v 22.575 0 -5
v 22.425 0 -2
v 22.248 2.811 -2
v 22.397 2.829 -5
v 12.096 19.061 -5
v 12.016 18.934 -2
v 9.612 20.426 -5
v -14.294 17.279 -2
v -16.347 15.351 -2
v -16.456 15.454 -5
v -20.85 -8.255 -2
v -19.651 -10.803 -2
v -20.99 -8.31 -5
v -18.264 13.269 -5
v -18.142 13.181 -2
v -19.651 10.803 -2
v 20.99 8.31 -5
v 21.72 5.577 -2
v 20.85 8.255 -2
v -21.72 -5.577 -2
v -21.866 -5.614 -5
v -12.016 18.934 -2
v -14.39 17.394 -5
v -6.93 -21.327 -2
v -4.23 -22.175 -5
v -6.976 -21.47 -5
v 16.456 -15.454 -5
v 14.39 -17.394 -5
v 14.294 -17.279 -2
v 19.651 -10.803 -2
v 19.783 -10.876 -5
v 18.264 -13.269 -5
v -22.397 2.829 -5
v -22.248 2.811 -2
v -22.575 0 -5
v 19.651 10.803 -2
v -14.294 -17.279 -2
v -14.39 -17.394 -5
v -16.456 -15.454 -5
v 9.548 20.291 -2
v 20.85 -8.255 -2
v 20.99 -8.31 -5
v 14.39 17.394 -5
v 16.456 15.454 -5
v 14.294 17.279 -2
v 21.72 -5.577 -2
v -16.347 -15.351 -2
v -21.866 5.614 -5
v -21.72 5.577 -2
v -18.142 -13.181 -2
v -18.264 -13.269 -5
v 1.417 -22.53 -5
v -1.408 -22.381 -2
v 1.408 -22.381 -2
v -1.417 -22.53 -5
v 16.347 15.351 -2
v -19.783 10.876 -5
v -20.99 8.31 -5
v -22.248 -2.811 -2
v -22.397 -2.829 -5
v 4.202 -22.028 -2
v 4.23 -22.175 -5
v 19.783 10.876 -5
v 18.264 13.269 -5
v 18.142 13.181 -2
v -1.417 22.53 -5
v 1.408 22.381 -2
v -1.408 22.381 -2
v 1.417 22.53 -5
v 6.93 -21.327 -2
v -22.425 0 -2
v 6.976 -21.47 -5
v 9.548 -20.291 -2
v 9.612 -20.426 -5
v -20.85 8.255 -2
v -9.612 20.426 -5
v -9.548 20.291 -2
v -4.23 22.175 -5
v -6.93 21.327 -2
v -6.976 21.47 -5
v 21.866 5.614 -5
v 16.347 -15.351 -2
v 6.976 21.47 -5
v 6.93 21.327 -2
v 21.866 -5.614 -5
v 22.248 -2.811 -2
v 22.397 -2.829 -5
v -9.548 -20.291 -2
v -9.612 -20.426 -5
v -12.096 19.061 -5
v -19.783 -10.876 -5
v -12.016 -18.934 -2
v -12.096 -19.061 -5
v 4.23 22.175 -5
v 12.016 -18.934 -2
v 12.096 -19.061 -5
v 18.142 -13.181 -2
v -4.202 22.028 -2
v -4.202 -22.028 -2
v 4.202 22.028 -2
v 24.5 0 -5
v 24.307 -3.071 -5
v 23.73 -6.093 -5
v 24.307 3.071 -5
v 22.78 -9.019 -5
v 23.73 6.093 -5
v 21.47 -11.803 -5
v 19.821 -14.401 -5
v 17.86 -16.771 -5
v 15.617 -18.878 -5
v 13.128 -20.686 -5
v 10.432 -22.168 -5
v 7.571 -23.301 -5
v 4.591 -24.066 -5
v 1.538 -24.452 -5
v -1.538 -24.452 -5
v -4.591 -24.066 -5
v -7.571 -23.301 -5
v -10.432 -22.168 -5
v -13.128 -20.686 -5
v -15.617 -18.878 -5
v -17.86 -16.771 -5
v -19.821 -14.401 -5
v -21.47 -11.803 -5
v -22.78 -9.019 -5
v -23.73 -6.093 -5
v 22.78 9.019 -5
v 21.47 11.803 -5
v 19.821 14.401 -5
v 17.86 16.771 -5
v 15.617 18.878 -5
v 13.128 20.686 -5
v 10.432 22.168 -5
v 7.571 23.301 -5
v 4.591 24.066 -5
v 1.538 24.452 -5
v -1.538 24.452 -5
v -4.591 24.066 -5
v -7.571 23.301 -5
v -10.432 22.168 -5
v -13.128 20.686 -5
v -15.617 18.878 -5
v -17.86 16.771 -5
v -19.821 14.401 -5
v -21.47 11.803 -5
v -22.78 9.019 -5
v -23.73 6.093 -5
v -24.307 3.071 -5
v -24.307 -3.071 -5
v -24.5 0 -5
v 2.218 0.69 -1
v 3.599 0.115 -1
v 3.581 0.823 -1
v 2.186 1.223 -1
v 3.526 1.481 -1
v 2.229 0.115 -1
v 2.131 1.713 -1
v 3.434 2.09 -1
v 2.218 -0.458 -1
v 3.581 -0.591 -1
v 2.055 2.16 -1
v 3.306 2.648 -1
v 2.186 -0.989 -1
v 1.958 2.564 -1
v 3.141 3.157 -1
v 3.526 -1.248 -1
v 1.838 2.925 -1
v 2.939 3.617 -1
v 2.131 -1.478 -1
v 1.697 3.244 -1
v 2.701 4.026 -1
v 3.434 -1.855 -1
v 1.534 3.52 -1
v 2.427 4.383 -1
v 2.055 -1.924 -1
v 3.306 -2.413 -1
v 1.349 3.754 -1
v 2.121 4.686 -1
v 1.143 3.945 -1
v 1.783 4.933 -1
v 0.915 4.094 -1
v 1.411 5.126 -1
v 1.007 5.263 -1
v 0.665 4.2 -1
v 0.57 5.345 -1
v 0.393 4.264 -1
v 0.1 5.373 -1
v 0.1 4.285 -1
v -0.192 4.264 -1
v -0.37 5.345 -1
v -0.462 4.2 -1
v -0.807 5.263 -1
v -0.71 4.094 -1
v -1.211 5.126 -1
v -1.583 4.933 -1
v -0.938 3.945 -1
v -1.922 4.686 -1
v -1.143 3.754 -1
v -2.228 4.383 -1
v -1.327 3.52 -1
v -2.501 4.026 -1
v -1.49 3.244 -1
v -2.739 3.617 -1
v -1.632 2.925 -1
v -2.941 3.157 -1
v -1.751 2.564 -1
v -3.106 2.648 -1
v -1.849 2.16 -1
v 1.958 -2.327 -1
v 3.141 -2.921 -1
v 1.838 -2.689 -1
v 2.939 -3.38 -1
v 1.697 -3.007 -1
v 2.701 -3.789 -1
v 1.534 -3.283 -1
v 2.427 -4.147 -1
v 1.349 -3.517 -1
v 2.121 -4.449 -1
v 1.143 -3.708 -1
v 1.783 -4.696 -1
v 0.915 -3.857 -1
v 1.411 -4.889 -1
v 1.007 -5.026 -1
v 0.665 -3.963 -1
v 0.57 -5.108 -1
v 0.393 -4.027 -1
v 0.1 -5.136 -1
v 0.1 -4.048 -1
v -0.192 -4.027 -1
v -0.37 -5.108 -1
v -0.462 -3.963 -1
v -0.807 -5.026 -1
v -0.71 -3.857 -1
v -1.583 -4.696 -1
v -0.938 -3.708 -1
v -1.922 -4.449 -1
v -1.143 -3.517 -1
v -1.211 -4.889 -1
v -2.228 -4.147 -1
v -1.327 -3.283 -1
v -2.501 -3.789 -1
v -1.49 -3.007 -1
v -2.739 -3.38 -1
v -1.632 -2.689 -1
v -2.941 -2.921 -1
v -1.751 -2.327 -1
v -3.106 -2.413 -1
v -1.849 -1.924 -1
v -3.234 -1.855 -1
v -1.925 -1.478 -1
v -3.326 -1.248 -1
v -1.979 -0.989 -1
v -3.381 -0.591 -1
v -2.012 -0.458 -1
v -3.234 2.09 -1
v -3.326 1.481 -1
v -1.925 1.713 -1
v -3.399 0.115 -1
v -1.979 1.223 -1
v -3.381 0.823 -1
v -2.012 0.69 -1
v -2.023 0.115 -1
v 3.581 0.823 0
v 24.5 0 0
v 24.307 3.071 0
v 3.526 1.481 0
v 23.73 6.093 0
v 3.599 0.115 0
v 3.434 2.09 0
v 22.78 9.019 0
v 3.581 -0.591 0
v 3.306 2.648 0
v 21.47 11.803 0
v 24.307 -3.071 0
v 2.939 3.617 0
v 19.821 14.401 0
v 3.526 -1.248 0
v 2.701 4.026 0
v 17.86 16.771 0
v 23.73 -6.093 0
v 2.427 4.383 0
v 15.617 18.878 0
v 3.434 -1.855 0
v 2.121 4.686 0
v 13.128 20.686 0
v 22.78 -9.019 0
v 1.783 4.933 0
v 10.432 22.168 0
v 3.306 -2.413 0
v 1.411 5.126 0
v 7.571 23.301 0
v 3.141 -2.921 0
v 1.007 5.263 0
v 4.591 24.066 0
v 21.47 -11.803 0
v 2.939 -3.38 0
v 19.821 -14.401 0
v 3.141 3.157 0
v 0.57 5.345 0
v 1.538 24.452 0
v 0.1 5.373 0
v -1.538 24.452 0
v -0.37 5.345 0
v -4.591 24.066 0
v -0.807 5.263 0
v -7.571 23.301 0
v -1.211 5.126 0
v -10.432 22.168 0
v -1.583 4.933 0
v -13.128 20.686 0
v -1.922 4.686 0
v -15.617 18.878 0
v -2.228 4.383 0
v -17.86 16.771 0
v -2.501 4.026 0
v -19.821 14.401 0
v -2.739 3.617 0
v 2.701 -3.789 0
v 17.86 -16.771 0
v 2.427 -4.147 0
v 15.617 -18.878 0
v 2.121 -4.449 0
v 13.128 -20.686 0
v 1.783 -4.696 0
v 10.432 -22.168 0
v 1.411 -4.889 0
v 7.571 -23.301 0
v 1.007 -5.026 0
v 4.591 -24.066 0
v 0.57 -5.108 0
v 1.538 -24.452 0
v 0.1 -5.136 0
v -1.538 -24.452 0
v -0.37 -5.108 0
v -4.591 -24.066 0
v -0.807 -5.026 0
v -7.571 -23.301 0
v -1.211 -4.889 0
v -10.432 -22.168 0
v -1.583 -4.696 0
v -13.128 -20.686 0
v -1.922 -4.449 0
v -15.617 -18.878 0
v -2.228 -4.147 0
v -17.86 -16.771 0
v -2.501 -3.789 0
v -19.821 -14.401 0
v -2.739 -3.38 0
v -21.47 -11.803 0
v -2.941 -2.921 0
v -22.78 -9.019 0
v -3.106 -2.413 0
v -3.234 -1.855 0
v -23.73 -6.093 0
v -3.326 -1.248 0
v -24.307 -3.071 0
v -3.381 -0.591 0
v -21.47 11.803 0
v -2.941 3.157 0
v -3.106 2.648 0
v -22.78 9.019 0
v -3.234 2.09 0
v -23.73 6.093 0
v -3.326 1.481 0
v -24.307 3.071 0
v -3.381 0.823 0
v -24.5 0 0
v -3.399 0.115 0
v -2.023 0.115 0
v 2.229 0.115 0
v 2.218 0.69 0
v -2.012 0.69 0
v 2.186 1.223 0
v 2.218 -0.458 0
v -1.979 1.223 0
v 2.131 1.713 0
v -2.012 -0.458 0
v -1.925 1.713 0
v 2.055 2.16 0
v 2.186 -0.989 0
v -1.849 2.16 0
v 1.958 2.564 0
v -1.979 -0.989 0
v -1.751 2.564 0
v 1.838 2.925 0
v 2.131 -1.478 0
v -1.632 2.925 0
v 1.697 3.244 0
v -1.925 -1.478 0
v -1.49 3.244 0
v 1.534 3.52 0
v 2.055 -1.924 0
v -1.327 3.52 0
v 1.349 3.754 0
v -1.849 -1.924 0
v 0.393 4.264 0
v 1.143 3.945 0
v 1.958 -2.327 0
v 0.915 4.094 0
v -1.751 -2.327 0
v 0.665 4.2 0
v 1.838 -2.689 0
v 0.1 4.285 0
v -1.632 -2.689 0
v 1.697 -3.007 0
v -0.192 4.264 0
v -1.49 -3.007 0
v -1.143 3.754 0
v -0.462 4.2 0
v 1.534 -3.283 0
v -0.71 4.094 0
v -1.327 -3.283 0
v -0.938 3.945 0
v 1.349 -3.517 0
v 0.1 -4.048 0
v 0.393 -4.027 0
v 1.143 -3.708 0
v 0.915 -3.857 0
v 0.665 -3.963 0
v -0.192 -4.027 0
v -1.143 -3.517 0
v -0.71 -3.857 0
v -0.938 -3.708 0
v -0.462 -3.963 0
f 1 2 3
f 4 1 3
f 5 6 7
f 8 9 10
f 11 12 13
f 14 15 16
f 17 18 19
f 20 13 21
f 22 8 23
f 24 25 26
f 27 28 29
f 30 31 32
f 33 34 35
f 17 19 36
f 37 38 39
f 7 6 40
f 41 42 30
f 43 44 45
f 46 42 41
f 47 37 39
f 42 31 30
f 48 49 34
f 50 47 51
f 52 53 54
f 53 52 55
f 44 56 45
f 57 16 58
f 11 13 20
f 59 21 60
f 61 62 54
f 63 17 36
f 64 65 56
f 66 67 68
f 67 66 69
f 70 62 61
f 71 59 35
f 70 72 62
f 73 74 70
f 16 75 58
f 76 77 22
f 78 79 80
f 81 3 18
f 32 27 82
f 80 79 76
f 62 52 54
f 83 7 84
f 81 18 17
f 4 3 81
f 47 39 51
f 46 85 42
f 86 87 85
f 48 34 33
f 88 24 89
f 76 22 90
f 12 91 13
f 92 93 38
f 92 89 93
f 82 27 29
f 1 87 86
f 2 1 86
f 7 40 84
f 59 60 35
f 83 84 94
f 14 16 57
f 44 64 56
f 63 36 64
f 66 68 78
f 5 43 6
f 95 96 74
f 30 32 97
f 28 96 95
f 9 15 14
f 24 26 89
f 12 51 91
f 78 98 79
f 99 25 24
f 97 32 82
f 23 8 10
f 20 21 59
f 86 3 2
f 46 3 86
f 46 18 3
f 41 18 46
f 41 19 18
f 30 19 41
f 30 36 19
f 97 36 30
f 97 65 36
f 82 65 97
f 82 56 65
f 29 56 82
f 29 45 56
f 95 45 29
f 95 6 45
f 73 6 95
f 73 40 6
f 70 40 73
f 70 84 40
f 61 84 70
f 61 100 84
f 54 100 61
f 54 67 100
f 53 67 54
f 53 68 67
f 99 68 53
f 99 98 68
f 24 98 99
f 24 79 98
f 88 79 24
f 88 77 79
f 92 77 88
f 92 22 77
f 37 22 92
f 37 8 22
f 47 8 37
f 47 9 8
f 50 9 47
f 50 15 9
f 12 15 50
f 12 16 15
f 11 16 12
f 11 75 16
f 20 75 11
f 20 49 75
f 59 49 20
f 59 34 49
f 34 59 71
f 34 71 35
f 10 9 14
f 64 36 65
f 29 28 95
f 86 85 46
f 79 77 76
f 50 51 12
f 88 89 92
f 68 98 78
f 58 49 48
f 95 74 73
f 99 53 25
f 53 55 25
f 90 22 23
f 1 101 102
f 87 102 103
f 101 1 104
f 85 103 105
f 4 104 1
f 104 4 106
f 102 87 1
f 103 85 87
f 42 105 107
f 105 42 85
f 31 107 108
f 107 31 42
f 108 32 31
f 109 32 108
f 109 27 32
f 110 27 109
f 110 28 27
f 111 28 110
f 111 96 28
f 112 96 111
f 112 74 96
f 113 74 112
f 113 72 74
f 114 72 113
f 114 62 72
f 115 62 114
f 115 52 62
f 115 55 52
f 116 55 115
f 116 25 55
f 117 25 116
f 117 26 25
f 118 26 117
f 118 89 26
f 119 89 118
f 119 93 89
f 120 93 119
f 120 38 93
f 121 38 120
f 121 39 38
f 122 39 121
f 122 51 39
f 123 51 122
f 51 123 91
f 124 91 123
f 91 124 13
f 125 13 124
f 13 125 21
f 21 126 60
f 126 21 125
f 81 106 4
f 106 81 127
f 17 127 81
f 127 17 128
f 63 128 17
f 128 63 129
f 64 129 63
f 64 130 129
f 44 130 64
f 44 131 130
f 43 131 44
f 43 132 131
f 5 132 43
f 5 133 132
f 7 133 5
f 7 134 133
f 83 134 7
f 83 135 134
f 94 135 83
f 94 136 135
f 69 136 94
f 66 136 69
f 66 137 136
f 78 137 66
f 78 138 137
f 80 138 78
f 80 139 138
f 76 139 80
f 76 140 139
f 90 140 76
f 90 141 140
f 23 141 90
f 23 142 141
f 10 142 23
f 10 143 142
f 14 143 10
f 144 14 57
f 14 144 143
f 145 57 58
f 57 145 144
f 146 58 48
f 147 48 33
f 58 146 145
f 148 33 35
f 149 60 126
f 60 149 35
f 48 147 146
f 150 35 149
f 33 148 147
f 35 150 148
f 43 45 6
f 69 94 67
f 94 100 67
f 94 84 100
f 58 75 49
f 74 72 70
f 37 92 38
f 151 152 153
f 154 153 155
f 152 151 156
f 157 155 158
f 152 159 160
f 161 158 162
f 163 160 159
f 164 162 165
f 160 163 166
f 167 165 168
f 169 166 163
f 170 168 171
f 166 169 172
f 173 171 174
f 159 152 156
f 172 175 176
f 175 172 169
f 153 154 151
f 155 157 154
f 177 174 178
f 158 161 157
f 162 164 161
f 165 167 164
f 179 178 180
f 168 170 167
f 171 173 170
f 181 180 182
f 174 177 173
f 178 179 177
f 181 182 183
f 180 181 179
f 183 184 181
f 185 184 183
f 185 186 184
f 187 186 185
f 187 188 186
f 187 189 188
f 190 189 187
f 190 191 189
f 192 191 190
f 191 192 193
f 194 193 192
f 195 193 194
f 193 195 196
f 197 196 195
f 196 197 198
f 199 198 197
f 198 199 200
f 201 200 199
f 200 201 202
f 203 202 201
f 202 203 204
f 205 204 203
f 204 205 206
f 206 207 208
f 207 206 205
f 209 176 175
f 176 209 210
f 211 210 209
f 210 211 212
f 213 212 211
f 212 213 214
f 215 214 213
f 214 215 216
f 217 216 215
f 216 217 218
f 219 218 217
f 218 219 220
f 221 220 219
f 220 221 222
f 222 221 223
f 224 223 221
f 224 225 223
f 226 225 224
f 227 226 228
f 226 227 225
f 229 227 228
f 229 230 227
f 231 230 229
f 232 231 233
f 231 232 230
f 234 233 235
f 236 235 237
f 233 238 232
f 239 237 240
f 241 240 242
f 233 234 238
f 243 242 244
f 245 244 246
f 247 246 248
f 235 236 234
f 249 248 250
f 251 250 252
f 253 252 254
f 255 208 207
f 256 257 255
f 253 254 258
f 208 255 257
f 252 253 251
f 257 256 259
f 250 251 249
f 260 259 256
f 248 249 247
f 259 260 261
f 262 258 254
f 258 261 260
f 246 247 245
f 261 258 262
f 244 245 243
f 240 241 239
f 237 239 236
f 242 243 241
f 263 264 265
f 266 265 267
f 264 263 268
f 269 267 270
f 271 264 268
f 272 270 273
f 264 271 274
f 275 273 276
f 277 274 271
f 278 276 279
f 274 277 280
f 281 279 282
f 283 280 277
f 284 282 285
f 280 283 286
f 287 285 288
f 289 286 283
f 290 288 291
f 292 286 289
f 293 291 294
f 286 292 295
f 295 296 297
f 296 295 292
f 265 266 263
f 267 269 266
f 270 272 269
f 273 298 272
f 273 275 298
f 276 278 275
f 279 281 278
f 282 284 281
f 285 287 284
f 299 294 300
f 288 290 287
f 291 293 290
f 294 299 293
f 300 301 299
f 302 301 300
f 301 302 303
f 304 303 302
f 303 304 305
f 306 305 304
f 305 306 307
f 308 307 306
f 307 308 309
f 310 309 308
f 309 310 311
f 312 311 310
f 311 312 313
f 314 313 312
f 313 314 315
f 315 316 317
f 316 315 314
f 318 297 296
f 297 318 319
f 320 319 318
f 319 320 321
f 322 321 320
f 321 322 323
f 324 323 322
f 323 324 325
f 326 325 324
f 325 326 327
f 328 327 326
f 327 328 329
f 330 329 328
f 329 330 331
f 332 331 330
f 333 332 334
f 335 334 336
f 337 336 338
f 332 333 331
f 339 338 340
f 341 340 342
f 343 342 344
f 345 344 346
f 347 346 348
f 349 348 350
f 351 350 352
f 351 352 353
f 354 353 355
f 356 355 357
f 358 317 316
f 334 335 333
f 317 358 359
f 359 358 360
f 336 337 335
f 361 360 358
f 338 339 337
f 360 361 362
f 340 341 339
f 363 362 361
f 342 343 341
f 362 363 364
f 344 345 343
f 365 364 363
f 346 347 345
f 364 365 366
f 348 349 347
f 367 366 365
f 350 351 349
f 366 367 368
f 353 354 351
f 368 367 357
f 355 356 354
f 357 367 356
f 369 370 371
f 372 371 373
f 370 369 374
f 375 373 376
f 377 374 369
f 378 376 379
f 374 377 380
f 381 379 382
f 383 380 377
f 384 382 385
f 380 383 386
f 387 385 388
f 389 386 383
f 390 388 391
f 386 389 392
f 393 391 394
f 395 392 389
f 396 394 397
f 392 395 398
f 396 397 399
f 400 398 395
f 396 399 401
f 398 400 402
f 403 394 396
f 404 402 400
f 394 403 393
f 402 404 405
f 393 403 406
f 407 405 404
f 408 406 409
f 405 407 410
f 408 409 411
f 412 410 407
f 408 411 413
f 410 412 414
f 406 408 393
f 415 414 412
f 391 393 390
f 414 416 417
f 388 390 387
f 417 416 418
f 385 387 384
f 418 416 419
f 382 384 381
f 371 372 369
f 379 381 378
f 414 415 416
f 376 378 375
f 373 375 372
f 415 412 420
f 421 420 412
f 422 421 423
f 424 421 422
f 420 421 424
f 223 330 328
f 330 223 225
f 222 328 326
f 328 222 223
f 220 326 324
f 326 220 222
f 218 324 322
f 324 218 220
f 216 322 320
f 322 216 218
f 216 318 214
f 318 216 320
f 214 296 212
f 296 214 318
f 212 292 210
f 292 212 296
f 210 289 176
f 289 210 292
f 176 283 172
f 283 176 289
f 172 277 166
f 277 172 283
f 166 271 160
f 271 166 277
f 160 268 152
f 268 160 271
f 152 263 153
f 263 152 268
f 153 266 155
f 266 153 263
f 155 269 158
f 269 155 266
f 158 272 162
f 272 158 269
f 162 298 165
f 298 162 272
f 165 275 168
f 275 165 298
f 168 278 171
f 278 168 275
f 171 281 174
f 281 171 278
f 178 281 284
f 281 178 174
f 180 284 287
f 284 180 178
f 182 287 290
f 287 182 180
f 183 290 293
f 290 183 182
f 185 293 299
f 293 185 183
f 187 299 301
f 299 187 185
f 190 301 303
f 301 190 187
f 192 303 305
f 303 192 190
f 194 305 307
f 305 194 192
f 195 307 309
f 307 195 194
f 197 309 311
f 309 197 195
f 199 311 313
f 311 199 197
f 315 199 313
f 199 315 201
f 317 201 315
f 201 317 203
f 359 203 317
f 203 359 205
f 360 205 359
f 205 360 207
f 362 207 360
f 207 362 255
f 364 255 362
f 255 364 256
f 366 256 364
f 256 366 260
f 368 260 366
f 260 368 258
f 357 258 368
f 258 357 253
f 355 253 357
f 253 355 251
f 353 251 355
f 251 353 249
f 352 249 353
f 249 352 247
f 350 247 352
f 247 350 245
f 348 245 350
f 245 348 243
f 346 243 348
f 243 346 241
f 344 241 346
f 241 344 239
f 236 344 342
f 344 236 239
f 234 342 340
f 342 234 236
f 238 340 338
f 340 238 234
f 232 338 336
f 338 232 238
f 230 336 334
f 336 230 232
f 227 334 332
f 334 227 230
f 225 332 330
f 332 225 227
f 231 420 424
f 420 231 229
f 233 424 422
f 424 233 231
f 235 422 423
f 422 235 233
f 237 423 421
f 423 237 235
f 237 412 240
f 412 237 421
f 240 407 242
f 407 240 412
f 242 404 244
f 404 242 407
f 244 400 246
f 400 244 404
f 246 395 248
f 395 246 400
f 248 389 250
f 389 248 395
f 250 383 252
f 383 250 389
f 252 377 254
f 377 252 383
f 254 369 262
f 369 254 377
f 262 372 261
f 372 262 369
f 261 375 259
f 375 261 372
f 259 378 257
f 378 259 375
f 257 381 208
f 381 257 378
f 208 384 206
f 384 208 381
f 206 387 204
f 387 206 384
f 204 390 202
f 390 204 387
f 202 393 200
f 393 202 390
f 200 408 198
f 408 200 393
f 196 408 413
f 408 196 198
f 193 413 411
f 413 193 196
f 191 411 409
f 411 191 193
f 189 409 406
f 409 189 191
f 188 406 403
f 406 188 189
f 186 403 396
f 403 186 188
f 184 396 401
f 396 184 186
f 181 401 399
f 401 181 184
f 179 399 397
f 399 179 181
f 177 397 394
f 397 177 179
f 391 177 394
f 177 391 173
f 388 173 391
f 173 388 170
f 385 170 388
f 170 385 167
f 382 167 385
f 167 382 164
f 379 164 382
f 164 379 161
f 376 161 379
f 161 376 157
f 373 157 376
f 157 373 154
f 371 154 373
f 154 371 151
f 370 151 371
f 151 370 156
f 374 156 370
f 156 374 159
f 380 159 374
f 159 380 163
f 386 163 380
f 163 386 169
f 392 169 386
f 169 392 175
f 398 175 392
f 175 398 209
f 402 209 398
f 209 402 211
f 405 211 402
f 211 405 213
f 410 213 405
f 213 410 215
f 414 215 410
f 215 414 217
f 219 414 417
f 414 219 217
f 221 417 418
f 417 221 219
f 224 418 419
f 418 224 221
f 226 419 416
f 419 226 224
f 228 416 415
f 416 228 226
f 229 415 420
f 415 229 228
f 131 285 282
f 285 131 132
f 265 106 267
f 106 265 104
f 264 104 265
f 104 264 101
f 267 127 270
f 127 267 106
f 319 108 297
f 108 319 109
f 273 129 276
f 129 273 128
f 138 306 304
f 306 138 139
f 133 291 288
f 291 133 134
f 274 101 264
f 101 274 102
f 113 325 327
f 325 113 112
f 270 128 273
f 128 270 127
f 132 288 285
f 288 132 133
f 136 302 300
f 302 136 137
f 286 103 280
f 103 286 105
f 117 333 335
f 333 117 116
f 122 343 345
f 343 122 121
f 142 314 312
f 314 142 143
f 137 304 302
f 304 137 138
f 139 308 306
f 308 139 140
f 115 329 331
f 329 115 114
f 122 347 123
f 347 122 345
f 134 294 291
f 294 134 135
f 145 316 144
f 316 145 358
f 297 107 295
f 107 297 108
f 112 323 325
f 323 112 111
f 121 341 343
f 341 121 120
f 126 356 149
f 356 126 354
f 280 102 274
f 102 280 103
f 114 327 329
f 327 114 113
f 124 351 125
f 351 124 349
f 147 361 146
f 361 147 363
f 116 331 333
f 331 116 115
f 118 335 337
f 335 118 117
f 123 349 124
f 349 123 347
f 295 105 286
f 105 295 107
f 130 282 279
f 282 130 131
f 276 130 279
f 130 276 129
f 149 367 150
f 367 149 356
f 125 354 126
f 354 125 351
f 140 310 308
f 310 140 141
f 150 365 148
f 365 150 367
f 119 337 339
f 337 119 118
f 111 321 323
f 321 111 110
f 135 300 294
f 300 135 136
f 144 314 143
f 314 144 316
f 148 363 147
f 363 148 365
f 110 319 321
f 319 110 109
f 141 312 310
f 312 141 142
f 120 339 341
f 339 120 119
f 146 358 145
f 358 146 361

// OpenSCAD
$fn = 50;

difference() {
	union() {
		translate(v = [0, 0, -5.0]) {
			cylinder(h = 5, r = 24.5);
		}
	}
	union() {
		#translate(v = [0, 0, -5.0]) {
			cylinder(h = 3, r1 = 22.575, r2 = 22.425);
		}
		translate(v = [0, 0, -1]) {
			linear_extrude(height = 1) {
				text(font = "Impact", halign = "center", size = 10, text = "0", valign = "center");
			}
		}
	}
}
